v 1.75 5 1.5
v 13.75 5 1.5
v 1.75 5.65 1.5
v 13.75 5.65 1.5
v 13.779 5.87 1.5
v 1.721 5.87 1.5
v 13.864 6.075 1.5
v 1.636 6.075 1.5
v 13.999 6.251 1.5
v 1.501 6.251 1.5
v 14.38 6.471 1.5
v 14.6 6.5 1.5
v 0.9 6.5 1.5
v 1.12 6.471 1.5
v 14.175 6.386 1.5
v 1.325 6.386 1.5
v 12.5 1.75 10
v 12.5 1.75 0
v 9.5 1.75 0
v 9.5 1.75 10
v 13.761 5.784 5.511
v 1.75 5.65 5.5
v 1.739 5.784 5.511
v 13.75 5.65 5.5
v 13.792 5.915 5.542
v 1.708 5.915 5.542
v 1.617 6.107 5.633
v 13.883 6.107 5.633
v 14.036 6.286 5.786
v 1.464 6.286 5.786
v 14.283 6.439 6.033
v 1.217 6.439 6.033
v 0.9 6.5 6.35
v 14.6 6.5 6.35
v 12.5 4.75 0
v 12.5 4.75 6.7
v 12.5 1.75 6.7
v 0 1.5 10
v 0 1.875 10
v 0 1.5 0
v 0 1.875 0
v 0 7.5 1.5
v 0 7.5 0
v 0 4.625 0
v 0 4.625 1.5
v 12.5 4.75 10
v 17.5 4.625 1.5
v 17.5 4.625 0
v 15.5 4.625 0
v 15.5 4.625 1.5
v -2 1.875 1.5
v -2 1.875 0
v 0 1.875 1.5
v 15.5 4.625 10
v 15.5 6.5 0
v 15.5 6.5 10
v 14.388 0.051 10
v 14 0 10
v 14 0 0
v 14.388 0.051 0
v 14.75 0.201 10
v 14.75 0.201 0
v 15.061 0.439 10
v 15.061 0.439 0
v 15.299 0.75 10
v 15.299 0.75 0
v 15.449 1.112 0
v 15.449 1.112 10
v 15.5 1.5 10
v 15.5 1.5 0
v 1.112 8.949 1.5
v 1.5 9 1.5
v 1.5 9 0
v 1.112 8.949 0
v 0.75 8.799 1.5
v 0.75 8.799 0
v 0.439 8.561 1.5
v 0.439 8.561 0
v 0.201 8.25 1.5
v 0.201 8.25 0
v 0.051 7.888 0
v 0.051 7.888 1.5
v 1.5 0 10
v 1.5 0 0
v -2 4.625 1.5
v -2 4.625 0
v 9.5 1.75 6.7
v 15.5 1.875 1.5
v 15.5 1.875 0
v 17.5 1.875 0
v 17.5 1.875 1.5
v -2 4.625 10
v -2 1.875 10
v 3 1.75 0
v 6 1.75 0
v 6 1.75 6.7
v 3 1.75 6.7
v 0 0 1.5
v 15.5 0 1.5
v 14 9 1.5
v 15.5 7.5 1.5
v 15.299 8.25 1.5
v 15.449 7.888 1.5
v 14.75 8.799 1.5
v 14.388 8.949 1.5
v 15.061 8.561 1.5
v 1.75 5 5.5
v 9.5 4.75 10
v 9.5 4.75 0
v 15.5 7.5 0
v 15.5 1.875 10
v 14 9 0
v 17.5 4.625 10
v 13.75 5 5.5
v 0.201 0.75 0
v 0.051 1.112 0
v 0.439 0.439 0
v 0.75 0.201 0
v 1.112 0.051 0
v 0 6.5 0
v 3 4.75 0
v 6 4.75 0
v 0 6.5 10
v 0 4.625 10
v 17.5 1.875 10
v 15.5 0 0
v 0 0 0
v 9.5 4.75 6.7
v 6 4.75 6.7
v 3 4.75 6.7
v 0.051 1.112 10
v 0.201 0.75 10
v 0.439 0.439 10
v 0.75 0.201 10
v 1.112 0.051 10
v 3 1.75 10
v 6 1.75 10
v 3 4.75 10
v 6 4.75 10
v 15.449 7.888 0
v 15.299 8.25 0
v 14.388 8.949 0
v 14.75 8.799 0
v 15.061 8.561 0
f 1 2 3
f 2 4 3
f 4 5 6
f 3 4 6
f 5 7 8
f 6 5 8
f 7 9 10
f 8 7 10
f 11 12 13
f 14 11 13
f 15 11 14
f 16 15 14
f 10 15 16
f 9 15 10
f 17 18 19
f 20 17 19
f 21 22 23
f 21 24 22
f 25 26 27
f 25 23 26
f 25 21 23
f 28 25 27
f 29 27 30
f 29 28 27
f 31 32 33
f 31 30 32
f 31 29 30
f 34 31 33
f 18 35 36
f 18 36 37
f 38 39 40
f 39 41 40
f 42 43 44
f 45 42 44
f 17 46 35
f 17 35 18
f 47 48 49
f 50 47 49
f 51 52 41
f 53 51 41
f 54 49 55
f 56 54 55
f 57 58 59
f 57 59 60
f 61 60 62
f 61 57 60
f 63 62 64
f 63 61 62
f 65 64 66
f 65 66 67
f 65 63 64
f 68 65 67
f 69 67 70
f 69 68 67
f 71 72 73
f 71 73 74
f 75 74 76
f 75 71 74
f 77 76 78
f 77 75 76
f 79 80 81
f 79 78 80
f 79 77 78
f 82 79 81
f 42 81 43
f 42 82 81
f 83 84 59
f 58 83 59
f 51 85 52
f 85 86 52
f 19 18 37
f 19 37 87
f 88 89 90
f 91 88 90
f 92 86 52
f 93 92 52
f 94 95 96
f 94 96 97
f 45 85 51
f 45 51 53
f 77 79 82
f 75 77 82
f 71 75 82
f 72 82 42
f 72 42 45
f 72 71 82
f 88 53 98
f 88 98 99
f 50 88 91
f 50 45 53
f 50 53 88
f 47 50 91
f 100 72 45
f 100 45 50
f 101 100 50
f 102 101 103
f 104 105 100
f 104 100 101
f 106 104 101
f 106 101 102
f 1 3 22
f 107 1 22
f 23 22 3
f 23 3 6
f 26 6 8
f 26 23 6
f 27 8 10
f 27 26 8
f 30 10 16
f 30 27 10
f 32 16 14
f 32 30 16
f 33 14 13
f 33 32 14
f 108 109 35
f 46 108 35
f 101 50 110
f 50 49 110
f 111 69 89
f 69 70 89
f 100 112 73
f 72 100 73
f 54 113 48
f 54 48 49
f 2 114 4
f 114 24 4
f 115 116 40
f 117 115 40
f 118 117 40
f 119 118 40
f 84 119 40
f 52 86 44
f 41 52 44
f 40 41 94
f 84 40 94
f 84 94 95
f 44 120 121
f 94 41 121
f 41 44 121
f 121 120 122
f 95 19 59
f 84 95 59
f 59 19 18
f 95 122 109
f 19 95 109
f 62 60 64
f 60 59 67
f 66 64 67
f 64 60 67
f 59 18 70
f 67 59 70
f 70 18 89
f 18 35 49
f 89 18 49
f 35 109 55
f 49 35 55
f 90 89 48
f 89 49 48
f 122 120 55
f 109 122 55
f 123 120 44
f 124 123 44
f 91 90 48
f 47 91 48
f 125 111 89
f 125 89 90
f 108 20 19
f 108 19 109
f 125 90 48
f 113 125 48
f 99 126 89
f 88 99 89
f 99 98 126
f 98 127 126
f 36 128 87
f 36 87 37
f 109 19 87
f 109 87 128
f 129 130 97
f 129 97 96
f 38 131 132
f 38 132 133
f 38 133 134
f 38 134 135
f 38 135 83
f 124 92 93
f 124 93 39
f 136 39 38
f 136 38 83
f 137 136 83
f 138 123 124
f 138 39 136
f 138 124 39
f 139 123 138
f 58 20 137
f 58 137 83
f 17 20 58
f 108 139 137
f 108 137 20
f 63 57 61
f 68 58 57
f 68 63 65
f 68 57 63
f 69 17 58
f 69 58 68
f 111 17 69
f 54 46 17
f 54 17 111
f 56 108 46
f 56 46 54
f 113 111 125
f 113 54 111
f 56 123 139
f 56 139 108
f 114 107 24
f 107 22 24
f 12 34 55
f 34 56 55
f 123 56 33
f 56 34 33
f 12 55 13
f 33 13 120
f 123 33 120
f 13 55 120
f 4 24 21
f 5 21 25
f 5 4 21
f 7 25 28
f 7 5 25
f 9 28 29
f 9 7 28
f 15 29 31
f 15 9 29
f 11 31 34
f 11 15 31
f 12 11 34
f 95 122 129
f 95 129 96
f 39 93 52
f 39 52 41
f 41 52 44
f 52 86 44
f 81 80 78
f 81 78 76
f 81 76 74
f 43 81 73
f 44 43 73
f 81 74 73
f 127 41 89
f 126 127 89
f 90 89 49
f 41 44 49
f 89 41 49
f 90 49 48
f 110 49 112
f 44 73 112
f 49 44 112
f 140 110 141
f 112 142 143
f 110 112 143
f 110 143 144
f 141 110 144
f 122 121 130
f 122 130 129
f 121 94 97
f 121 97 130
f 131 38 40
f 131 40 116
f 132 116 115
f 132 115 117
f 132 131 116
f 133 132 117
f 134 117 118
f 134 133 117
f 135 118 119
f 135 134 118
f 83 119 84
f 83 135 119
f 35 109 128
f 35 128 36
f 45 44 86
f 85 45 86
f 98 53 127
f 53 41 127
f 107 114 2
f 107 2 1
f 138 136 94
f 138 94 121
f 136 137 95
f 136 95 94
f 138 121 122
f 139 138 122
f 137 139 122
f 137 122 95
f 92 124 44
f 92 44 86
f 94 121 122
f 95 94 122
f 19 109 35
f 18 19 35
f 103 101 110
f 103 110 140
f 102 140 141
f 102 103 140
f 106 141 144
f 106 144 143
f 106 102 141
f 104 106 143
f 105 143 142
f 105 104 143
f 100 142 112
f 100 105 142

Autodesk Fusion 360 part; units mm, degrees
sketch "Sketch1" plane through (0, 0, 0) normal (0, 0, 1) x (1, 0, 0) in component "USB-Cover"
  line L0 (0, 0) -> (15.5, 0)
  line L1 (15.5, 0) -> (15.5, 9)
  line L2 (15.5, 9) -> (0, 9)
  line L3 (0, 9) -> (0, 0)
  line L4 (0, 0) -> (15.5, 0)
  line L5 (15.5, 0) -> (15.5, 6.5)
  line L6 (15.5, 6.5) -> (0, 6.5)
  line L7 (0, 6.5) -> (0, 0)
  line L8 (15.5, 1.875) -> (17.5, 1.875)
  line L9 (17.5, 1.875) -> (17.5, 4.625)
  line L10 (17.5, 4.625) -> (15.5, 4.625)
  line L11 (15.5, 4.625) -> (15.5, 1.875)
  line L12 (15.5, 0) -> (18.6778, 0) construction
  line L13 (-2, 1.875) -> (0, 1.875)
  line L14 (0, 4.625) -> (-2, 4.625)
  line L15 (0, 1.875) -> (0, 4.625)
  line L16 (-2, 4.625) -> (-2, 1.875)
  line L17 (3, 4.75) -> (6, 4.75)
  line L18 (6, 4.75) -> (6, 1.75)
  line L19 (6, 1.75) -> (3, 1.75)
  line L20 (3, 1.75) -> (3, 4.75)
  line L21 (9.5, 4.75) -> (12.5, 4.75)
  line L22 (9.5, 1.75) -> (9.5, 4.75)
  line L23 (12.5, 1.75) -> (9.5, 1.75)
  line L24 (12.5, 4.75) -> (12.5, 1.75)
  line L25 (1.2119, 0) -> (-4.6965, 0) construction
  dimension "d1" = 15.5
  dimension "d2" = 9
  dimension "d3" = 6.5
  dimension "d4" = 2
  dimension "d5" = 2.75
  dimension "d6" = 1.875
  dimension "d7" = 2
  dimension "d8" = 2.75
  dimension "d9" = 3
  dimension "d10" = 3
  dimension "d11" = 1.75
  dimension "d12" = 3
  dimension "d13" = 3
  dimension "d14" = 3
  dimension "d30" = 1.75
  dimension "d31" = 1.875
extrude "Extrude4" add sketch "Sketch1" along normal blind 6.7 contours L17 L18 L19 L20 | L21 L22 L23 L24 makes body 1 at (9.5, 3.75, 4.4667) makes body 2 at (3, 3.75, 4.4667) in component "USB-Cover"
extrude "Extrude2" add sketch "Sketch1" along normal blind 10 separate body contours L0 L1 L3 L4 L5 L6 L7 L11 L15 | L3 L7 L13 L14 L15 L16 | L1 L5 L8 L9 L10 L11 makes body 3 in component "USB-Cover"
extrude "Extrude1" add sketch "Sketch1" along normal blind 1.5 separate body contours L0 L1 L3 L4 L5 L6 L7 L11 L15 | L3 L7 L13 L14 L15 L16 | L1 L5 L8 L9 L10 L11 | L1 L2 L3 L6 | L17 L18 L19 L20 | L21 L22 L23 L24 makes body 4 in component "USB-Cover"
fillet "Fillet1" radius 1.5 6 edges at (15.5, 9, 0.75) (0, 9, 0.75) (15.5, 0, 0.75) (0, 0, 0.75) (15.5, 0, 5) (0, 0, 5) on bodies 3 4 in component "USB-Cover"
sketch "Sketch2" plane through (0, 6.5, 0) normal (0, 1, 0) x (-1, 0, 0) in component "USB-Cover"
  line L0 (-15.5, 0) -> (0, 0)
  line L1 (0, 0) -> (0, 10)
  line L2 (0, 10) -> (-15.5, 10)
  line L3 (-15.5, 10) -> (-15.5, 0)
  line L4 (-15.5, 1.5) -> (-14, 1.5)
  line L5 (-14, 1.5) -> (-1.5, 1.5)
  line L6 (0, 0) -> (0, 10)
  line L7 (-13.75, 1.5) -> (-1.75, 1.5)
  line L8 (-1.75, 1.5) -> (-1.75, 5.5)
  line L9 (-1.75, 5.5) -> (-13.75, 5.5)
  line L10 (-13.75, 5.5) -> (-13.75, 1.5)
  dimension "d21" = 12
  dimension "d22" = 4
  dimension "d23" = 1.75
extrude "Extrude3" cut sketch "Sketch2" against normal blind 1.5 contours L5 L7 L8 L9 L10 bodies 3 in component "USB-Cover"
fillet "Fillet2" radius 0.85 3 edges at (13.75, 6.5, 3.5) (7.75, 6.5, 5.5) (1.75, 6.5, 3.5) on bodies 3 in component "USB-Cover"
component "USB-Cover" placed x (1, 0, 0) y (0, 1, 0) z (0, 0, 1) at (0, 0, 0)
